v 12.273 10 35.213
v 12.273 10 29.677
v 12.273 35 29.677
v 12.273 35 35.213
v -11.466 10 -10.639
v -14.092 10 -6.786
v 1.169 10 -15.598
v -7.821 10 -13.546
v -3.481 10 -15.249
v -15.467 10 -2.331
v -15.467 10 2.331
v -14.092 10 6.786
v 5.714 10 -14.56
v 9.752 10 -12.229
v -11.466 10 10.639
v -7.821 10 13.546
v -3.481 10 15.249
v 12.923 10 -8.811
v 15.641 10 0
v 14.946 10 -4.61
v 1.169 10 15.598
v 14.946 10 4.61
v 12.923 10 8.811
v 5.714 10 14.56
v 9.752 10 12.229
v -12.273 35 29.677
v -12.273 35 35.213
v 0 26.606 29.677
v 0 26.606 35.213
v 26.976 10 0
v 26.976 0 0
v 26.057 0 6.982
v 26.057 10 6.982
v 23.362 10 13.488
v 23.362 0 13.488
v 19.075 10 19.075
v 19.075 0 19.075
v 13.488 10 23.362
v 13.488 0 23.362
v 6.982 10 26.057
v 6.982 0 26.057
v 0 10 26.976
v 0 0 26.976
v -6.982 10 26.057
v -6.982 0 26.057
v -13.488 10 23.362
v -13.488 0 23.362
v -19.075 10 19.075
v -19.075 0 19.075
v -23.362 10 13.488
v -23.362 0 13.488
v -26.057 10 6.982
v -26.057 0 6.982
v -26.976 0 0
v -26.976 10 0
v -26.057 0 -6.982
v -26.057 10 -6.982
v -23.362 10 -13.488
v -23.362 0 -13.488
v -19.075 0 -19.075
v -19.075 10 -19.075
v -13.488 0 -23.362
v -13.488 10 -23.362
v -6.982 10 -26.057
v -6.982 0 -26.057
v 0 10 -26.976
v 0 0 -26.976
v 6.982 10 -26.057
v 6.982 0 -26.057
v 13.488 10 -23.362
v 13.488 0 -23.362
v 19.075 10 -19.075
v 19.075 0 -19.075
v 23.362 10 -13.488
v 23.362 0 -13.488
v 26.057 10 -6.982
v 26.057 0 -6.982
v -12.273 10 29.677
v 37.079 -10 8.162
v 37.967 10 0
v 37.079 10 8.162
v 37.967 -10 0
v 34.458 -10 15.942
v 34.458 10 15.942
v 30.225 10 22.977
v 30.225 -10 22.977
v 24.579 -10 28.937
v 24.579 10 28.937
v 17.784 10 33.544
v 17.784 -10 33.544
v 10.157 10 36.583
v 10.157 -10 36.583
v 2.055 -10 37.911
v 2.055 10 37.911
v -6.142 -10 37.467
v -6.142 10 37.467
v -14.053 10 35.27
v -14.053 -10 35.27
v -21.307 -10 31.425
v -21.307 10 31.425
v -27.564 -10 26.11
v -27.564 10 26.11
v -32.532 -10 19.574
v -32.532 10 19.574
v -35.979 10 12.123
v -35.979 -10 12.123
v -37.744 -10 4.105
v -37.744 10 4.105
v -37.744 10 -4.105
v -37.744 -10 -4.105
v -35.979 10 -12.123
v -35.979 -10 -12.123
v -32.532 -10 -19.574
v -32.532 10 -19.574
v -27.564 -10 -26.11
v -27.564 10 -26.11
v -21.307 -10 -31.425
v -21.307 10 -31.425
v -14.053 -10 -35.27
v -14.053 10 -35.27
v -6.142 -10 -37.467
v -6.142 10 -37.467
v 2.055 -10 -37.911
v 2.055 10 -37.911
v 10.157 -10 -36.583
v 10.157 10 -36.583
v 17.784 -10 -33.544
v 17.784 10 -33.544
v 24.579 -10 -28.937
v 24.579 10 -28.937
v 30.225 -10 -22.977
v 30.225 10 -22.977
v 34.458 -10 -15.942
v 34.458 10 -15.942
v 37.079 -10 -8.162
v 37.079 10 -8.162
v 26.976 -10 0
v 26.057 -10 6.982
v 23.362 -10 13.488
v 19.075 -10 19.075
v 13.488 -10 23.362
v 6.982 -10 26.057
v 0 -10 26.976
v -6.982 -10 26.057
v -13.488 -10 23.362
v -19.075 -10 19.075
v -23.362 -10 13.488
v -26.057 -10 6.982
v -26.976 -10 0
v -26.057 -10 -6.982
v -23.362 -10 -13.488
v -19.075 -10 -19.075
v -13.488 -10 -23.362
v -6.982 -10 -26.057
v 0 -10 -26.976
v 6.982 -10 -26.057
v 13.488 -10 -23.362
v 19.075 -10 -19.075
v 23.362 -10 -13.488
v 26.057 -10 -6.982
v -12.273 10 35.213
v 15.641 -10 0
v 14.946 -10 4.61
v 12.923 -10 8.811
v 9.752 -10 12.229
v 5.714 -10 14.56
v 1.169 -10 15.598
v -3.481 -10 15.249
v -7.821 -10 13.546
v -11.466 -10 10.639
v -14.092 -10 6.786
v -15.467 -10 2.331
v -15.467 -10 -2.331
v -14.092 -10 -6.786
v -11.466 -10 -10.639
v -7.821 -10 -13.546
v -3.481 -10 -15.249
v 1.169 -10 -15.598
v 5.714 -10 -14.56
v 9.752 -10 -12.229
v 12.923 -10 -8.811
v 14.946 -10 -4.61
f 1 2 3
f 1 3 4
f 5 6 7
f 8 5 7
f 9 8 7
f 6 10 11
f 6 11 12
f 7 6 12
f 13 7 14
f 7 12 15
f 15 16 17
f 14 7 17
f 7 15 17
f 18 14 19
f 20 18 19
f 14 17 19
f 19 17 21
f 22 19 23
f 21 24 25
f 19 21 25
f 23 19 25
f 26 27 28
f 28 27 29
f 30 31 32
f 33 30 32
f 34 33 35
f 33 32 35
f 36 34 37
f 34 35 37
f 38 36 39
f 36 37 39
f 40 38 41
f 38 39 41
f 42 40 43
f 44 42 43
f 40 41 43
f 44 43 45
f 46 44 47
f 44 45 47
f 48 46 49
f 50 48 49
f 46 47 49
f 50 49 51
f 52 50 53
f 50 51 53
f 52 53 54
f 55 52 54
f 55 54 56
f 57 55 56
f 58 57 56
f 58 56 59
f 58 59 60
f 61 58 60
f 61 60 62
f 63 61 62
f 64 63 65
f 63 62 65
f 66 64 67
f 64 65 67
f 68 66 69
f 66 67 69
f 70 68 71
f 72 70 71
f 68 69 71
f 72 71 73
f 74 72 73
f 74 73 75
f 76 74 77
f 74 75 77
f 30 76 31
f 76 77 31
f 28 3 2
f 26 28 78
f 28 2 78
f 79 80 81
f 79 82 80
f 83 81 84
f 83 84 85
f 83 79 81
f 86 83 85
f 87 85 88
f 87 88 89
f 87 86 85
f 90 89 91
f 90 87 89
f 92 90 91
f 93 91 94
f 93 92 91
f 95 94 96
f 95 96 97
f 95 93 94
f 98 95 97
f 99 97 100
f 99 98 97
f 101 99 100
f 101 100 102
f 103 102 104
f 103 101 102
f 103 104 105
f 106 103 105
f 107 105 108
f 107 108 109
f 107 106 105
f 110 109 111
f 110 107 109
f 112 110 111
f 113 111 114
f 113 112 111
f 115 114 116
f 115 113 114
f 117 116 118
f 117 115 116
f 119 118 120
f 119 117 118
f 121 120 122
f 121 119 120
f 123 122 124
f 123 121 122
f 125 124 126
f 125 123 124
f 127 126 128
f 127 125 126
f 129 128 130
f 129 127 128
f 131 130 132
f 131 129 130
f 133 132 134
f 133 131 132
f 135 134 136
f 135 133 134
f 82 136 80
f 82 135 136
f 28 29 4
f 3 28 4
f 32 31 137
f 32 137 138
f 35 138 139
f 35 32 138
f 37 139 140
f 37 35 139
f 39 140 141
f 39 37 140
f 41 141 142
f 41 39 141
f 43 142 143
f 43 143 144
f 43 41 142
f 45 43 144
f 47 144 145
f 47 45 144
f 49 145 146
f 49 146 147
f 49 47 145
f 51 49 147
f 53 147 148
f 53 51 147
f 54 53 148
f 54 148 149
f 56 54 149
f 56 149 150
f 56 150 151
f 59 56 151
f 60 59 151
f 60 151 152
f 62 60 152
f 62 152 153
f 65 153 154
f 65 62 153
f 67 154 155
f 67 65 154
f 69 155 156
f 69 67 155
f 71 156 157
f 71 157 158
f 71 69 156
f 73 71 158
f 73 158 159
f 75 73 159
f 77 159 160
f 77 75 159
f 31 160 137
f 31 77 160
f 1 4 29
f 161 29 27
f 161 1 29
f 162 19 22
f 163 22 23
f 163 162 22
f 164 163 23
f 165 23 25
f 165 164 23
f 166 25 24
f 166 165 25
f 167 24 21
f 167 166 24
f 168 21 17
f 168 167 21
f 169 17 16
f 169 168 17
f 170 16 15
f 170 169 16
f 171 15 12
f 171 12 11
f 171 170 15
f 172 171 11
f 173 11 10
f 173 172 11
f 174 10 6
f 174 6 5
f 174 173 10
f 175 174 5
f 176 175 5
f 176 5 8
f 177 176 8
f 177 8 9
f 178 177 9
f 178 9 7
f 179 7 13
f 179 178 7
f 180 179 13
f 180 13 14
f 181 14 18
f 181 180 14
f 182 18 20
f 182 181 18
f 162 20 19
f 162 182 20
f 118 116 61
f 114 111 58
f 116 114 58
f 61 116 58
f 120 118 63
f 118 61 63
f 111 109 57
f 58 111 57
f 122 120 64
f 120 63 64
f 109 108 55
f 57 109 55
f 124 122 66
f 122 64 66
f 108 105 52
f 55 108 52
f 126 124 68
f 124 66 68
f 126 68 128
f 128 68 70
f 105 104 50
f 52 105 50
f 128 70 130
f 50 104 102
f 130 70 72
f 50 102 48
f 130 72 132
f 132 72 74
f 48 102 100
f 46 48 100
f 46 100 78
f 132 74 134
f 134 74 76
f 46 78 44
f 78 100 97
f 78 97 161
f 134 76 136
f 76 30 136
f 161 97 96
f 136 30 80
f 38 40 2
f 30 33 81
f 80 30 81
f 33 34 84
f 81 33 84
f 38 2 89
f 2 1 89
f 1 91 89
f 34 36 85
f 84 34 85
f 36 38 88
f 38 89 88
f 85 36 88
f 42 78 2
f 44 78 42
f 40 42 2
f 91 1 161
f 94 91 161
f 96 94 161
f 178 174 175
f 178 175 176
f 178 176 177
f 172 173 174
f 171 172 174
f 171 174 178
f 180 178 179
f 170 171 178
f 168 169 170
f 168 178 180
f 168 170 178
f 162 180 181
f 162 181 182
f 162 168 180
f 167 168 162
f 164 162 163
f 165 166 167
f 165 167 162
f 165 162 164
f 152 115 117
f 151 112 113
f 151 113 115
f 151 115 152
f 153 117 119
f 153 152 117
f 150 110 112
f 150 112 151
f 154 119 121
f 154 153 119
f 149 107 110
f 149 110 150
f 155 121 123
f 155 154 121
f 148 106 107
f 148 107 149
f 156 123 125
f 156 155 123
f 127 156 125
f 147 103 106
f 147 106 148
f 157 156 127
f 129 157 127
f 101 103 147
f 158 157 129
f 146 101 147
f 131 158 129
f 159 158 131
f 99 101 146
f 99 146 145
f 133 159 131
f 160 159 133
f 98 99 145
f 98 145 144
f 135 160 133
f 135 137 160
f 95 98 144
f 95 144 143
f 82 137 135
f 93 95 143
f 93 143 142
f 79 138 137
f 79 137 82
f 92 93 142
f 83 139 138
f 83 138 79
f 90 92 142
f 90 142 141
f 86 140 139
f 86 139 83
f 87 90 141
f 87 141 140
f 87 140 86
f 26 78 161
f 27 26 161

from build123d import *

# Parameters (mm, degrees)
F0_R          = 37.966897
F0_R_2        = 26.975796
F0_R_3        = 15.641275
F1_DEPTH      = 10
F1_DEPTH_BACK = 10
F2_W          = 24.54576
F2_H          = 5.535711
F3_DEPTH      = 25
F5_DEPTH      = 25


with BuildPart() as f1:
    # F0 (on Front) → F1 (new body, two sides)
    with BuildSketch(Plane.XZ) as f1_sk:
        Circle(F0_R)
        Circle(F0_R_2, mode=Mode.SUBTRACT)
        Circle(F0_R_3)
    extrude(amount=F1_DEPTH)
    extrude(f1_sk.sketch, amount=-F1_DEPTH_BACK)

    # F2 (on face) → F3 (join)
    with BuildSketch(Plane(origin=(0, 10, 0), x_dir=(-1, 0, 0), z_dir=(0, 1, 0))):
        with Locations((0, 32.445132)):
            Rectangle(F2_W, F2_H)
    extrude(amount=F3_DEPTH)

    # F4 (on face) → F5 (cut)
    with BuildSketch(Plane.XY.offset(35.212988)):
        Polygon((12.27288, 35), (-12.27288, 35), (0, 26.605694), align=None)
    extrude(amount=-F5_DEPTH, mode=Mode.SUBTRACT)


solid = f1.part
